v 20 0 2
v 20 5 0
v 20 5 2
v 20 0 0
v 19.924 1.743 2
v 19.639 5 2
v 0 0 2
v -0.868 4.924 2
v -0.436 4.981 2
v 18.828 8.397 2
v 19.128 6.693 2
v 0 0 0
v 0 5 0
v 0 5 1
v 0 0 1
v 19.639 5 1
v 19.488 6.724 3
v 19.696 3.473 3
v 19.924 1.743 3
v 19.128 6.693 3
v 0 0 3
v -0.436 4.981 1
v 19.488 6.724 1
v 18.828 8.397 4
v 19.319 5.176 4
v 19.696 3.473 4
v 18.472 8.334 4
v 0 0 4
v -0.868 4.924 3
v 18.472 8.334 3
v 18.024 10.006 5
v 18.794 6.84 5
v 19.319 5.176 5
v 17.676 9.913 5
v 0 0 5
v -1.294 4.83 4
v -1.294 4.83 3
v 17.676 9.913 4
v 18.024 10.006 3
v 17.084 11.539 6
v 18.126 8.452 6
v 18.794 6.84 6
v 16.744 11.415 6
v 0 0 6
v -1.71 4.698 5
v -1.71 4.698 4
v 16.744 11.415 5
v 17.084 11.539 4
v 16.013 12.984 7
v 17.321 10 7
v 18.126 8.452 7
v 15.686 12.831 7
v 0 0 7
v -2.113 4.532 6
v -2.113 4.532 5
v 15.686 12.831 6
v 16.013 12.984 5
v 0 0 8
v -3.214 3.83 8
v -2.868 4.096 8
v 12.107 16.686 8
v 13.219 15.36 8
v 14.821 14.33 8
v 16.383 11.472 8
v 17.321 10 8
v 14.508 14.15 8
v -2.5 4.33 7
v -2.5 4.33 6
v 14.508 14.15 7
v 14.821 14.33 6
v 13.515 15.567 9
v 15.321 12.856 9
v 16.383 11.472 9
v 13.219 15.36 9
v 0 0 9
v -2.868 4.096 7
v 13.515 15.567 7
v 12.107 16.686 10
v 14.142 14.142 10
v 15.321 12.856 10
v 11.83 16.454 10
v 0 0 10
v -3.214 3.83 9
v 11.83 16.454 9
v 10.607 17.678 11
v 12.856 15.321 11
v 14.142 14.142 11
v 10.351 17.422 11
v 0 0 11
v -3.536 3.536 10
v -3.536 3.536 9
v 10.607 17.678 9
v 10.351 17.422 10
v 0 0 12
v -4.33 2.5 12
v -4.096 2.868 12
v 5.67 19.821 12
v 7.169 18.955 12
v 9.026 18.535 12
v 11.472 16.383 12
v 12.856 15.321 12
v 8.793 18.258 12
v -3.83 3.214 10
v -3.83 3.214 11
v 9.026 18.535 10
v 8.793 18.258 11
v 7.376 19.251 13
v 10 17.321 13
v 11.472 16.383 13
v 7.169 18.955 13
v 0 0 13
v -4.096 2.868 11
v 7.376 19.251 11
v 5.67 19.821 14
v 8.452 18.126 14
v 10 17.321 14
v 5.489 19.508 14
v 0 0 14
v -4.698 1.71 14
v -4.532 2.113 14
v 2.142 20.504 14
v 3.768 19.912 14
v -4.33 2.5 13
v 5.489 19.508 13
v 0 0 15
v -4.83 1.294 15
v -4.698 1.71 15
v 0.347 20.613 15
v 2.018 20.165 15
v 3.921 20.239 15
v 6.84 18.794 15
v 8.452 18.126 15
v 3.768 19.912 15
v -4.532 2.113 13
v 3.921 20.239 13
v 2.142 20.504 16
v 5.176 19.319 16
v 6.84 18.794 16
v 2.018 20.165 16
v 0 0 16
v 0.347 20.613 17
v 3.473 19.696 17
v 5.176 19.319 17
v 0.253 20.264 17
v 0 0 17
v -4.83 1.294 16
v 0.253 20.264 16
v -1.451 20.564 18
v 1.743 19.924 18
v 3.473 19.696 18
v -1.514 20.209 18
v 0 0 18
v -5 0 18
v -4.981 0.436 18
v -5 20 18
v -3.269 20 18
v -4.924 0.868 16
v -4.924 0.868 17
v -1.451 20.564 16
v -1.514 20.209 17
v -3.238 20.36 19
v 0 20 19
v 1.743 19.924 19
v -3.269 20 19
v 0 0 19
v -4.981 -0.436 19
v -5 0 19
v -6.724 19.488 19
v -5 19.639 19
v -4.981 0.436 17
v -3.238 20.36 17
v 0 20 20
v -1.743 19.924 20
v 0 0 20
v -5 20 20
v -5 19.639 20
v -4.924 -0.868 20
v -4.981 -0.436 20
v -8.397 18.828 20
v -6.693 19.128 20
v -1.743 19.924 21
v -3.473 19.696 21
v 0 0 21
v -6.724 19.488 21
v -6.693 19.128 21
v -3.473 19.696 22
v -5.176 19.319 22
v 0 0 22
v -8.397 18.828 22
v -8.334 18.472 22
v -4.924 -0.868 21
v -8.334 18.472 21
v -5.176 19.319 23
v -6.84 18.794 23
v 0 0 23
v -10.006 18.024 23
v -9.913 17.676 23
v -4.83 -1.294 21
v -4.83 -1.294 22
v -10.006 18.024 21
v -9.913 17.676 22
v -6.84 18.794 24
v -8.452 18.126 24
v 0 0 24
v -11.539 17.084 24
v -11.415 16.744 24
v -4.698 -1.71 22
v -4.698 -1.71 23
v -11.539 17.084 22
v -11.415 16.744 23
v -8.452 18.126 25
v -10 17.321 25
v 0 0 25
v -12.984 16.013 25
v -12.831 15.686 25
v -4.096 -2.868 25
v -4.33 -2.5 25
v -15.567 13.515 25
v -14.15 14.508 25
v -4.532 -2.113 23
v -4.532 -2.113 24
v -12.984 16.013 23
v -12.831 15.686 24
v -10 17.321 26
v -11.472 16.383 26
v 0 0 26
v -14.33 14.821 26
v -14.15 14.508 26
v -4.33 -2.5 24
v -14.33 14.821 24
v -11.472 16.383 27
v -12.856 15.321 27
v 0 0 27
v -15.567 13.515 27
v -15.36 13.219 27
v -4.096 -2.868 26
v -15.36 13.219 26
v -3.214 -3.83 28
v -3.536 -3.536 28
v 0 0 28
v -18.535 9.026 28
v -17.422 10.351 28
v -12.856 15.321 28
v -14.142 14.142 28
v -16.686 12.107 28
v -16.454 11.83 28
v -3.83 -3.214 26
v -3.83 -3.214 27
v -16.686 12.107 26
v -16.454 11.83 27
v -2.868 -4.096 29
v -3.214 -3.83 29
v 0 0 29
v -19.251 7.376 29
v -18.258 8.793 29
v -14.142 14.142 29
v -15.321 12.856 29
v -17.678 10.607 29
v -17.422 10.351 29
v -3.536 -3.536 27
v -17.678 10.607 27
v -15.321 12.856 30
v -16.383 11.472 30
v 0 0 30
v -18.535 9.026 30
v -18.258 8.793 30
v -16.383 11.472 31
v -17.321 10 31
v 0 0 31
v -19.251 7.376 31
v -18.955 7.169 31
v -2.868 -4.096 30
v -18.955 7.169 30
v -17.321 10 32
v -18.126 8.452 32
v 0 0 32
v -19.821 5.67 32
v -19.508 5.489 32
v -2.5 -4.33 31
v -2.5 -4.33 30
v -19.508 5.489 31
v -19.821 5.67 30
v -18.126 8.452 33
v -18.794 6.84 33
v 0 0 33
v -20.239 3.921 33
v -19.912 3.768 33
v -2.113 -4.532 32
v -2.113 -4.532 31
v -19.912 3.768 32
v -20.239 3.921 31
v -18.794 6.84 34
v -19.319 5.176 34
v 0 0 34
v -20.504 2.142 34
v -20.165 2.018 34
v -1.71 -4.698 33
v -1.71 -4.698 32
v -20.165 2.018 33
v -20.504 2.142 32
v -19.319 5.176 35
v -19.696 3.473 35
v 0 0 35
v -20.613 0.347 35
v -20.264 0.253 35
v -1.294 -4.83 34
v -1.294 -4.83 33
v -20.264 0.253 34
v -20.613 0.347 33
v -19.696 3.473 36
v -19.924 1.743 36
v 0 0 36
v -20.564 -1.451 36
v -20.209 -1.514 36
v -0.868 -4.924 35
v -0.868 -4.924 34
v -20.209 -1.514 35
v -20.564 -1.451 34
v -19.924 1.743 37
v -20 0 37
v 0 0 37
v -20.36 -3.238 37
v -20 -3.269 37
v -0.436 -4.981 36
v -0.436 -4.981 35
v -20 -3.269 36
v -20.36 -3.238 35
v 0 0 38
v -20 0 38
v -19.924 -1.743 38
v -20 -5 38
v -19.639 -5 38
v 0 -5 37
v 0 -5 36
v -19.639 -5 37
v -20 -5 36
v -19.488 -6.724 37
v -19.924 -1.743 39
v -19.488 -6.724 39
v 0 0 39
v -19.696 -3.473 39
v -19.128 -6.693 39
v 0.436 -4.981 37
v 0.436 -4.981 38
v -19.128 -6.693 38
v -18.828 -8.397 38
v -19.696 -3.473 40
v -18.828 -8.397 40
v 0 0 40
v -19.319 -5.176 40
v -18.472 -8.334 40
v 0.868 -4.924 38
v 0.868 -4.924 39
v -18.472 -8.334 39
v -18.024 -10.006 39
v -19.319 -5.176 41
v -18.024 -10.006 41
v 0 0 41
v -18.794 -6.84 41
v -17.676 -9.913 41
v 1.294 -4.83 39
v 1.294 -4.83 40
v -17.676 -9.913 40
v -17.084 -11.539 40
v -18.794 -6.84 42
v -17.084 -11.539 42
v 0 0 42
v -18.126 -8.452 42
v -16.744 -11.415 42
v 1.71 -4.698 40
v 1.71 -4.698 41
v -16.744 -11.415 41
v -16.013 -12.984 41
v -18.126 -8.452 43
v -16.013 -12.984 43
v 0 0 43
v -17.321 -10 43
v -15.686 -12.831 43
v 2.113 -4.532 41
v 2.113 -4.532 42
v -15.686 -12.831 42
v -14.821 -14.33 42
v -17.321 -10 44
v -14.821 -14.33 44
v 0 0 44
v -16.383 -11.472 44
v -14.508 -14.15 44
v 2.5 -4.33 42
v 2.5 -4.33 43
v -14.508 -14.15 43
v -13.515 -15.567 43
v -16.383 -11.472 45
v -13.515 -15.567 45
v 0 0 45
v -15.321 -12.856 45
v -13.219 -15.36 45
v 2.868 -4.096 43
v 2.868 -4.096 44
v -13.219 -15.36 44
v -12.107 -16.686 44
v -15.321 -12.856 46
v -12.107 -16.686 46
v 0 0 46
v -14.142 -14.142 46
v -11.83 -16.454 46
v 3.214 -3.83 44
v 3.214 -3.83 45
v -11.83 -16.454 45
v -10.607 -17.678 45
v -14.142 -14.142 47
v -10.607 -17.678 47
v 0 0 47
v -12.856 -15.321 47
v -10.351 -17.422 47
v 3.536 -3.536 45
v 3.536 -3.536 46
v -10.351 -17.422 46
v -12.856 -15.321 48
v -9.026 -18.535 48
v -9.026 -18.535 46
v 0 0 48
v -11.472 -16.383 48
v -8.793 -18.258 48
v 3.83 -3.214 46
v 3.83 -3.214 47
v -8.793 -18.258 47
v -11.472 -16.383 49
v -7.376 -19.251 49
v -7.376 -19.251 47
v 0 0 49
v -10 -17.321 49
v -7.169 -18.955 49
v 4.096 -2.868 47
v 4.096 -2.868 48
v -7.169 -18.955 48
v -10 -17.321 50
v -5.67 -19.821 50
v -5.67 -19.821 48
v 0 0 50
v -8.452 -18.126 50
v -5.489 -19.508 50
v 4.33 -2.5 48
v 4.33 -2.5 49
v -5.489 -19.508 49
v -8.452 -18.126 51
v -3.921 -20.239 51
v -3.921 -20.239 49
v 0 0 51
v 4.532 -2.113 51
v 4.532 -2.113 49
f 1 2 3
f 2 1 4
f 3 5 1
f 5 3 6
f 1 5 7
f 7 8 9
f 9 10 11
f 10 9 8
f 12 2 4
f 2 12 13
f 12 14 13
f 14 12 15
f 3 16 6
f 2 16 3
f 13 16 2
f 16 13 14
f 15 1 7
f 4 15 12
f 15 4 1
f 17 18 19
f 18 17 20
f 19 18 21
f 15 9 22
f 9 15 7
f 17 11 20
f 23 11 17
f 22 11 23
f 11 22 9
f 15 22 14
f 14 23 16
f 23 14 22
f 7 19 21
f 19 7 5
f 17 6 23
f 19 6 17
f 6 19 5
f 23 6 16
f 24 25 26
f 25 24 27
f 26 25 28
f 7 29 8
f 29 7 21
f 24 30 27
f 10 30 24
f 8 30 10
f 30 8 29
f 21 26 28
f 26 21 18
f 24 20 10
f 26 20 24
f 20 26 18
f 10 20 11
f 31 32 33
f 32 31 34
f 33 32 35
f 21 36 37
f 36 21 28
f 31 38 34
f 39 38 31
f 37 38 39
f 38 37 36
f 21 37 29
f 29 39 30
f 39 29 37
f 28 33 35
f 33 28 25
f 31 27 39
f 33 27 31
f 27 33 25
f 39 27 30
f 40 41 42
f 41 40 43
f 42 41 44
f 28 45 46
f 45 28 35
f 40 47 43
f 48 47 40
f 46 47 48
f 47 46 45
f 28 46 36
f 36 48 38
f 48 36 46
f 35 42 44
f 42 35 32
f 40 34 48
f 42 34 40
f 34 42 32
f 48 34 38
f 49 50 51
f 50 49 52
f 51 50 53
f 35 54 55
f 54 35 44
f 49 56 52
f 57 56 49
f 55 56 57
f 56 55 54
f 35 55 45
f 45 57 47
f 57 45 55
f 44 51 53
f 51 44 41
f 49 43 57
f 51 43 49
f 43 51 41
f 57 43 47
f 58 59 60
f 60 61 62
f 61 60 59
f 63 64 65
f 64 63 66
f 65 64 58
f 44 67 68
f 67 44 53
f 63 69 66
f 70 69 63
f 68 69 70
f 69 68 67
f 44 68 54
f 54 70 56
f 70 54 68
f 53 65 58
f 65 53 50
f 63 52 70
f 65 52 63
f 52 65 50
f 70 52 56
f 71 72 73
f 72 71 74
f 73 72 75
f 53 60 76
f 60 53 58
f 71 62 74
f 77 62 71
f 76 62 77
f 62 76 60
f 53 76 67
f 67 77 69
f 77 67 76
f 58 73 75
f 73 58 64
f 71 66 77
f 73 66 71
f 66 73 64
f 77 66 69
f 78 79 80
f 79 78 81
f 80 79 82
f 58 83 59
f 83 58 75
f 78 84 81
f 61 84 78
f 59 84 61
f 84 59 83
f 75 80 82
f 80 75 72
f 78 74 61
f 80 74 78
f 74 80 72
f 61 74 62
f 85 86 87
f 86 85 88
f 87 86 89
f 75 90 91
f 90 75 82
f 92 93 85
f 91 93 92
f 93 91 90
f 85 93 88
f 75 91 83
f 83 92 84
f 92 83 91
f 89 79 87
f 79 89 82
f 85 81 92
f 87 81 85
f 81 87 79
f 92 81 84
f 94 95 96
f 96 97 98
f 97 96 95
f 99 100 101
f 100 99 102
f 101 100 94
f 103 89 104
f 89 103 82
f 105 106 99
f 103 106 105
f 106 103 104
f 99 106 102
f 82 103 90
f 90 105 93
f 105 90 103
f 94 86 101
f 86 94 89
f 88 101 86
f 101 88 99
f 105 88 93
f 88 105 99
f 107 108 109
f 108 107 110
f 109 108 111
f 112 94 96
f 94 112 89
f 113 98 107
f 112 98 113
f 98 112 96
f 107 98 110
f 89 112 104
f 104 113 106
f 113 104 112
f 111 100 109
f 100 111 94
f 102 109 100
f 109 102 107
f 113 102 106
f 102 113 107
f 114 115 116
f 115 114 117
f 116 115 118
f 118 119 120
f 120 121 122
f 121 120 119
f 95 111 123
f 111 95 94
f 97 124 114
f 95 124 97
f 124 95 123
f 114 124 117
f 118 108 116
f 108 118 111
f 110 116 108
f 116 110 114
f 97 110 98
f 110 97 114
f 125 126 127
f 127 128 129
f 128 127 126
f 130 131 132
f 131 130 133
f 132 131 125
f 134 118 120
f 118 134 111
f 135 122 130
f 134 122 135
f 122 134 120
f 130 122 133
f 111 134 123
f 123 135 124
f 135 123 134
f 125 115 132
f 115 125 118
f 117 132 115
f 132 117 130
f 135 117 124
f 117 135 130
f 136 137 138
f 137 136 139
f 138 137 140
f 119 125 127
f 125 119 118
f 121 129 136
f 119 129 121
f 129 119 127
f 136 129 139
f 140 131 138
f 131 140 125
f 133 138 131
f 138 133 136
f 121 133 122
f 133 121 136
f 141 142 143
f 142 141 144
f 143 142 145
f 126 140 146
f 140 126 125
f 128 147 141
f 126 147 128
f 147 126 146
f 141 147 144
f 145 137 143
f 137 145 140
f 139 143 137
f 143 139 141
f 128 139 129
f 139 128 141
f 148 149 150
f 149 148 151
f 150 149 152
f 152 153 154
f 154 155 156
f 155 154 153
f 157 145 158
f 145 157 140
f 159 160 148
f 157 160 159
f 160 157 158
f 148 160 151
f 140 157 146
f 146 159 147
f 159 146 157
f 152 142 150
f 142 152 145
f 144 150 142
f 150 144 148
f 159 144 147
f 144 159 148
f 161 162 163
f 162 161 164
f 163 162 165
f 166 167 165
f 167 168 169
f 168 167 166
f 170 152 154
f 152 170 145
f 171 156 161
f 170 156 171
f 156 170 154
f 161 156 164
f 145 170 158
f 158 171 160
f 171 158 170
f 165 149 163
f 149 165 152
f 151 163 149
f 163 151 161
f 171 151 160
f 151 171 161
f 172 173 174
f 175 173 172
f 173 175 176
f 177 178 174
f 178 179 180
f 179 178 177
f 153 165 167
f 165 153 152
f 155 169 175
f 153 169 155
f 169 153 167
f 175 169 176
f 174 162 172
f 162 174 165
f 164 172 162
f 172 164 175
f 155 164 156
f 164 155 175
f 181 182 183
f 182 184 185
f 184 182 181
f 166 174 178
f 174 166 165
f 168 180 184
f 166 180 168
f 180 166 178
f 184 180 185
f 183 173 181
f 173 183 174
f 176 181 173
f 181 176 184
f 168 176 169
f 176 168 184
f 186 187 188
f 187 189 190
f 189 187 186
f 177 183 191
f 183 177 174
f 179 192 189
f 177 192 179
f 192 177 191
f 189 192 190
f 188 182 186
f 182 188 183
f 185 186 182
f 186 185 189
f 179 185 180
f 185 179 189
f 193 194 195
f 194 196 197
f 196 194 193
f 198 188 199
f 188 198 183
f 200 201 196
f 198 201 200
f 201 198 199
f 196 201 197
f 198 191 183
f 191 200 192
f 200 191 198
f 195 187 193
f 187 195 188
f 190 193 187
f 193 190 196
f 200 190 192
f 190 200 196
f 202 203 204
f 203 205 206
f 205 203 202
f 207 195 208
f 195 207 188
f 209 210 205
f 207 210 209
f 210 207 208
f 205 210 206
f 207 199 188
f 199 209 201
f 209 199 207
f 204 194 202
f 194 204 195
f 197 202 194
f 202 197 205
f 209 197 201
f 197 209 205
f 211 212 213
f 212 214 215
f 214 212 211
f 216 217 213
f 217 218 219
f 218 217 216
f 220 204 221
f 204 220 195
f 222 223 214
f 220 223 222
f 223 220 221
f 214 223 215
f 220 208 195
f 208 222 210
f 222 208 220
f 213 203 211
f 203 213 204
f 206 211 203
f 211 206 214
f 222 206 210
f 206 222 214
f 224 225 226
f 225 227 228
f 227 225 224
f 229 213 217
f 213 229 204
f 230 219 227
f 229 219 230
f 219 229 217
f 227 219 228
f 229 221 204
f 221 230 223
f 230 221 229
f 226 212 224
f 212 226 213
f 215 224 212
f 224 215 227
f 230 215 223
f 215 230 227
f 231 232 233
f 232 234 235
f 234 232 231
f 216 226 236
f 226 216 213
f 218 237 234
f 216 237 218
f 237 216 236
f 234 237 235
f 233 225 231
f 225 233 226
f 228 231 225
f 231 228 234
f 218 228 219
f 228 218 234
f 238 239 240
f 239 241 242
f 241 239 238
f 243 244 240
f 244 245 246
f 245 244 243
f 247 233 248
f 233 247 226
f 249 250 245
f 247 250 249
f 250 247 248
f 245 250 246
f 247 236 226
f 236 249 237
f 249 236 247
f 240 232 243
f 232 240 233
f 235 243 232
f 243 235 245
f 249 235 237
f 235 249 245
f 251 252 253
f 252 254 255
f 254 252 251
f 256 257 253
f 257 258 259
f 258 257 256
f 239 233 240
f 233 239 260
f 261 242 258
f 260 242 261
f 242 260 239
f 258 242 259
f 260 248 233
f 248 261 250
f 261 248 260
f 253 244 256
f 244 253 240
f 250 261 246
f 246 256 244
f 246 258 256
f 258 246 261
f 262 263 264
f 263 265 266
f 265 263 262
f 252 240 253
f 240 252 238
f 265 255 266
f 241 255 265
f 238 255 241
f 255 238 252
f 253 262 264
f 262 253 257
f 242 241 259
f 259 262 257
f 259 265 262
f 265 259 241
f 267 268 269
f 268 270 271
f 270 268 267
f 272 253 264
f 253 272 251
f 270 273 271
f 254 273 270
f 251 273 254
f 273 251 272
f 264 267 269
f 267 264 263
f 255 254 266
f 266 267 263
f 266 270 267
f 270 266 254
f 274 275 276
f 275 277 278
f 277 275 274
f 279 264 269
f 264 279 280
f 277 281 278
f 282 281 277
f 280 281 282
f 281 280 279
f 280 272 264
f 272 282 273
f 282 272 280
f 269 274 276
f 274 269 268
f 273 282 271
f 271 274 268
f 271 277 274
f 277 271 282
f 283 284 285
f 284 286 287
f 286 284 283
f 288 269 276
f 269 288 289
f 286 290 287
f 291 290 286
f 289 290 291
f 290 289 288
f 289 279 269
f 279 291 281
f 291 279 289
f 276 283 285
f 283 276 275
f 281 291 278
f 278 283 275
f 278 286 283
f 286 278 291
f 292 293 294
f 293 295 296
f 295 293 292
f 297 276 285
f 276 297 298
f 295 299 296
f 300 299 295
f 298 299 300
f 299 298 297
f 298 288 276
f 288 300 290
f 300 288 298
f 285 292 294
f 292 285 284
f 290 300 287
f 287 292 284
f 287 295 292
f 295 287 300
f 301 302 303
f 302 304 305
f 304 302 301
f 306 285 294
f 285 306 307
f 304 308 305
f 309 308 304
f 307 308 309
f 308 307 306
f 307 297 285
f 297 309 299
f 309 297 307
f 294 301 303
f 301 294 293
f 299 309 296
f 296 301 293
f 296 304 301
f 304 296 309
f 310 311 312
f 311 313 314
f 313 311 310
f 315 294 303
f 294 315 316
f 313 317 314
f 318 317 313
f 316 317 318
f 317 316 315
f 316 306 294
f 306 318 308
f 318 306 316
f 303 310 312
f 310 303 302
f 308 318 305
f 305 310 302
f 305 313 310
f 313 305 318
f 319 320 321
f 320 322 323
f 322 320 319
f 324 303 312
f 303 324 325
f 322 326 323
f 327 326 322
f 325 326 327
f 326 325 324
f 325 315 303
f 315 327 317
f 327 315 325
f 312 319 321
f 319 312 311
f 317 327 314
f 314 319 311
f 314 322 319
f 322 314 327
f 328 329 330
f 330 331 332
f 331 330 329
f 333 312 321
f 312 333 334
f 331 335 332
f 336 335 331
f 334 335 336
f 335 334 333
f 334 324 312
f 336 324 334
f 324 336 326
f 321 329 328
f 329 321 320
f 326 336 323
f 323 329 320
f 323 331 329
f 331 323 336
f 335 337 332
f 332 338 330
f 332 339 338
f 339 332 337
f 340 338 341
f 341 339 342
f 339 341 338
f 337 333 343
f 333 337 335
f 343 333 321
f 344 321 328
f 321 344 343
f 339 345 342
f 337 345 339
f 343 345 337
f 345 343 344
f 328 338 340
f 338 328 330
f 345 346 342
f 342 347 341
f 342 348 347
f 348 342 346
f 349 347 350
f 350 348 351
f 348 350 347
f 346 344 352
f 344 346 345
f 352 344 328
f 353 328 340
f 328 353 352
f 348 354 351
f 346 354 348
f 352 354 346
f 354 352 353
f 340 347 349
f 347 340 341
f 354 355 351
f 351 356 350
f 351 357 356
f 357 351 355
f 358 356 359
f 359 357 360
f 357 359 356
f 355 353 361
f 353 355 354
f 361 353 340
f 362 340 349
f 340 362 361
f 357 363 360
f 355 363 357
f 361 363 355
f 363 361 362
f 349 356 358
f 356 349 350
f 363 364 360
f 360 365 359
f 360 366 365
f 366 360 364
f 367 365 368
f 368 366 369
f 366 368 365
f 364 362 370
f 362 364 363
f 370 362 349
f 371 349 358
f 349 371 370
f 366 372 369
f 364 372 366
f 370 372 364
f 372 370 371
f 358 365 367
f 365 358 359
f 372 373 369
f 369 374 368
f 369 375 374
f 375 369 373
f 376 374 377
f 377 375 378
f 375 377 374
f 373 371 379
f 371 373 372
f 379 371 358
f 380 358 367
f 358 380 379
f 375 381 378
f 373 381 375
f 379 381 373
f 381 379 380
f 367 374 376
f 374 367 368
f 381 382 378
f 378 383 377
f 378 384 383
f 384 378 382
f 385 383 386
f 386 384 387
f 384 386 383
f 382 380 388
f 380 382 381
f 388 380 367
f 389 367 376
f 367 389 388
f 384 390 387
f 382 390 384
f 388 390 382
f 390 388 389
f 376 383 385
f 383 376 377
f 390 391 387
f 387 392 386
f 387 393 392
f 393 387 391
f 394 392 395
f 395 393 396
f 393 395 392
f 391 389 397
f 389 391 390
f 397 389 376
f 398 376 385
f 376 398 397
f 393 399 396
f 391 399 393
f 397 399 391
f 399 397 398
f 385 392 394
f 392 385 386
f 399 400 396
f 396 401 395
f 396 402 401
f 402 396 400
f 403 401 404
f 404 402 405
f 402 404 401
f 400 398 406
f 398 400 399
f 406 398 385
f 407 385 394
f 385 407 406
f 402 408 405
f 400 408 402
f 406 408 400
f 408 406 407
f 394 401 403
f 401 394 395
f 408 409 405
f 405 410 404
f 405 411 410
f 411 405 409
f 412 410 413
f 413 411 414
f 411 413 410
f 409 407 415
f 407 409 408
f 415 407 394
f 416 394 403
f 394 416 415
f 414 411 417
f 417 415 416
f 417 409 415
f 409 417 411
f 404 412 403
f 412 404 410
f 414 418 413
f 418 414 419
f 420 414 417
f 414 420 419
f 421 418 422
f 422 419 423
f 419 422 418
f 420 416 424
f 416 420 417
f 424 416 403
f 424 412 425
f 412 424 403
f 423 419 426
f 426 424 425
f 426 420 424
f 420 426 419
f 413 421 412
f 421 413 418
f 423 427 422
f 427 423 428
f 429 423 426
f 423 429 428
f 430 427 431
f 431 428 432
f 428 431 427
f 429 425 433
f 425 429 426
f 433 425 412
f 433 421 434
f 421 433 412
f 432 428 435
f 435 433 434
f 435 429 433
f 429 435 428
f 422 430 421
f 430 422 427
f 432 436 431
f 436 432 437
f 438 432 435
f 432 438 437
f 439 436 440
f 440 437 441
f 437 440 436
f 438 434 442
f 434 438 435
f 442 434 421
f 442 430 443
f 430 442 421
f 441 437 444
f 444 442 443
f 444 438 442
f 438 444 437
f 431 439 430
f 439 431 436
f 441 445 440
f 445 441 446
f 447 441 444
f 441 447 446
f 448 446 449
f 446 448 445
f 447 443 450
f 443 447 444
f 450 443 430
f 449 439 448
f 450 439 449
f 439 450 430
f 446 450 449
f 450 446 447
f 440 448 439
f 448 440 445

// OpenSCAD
union() {
	translate(v = [0, 0, 0]) {
		rotate(a = 0, v = [0, 0, 1]) {
			cube(size = [20, 5, 2]);
		}
	}
	translate(v = [0, 0, 1]) {
		rotate(a = 5, v = [0, 0, 1]) {
			cube(size = [20, 5, 2]);
		}
	}
	translate(v = [0, 0, 2]) {
		rotate(a = 10, v = [0, 0, 1]) {
			cube(size = [20, 5, 2]);
		}
	}
	translate(v = [0, 0, 3]) {
		rotate(a = 15, v = [0, 0, 1]) {
			cube(size = [20, 5, 2]);
		}
	}
	translate(v = [0, 0, 4]) {
		rotate(a = 20, v = [0, 0, 1]) {
			cube(size = [20, 5, 2]);
		}
	}
	translate(v = [0, 0, 5]) {
		rotate(a = 25, v = [0, 0, 1]) {
			cube(size = [20, 5, 2]);
		}
	}
	translate(v = [0, 0, 6]) {
		rotate(a = 30, v = [0, 0, 1]) {
			cube(size = [20, 5, 2]);
		}
	}
	translate(v = [0, 0, 7]) {
		rotate(a = 35, v = [0, 0, 1]) {
			cube(size = [20, 5, 2]);
		}
	}
	translate(v = [0, 0, 8]) {
		rotate(a = 40, v = [0, 0, 1]) {
			cube(size = [20, 5, 2]);
		}
	}
	translate(v = [0, 0, 9]) {
		rotate(a = 45, v = [0, 0, 1]) {
			cube(size = [20, 5, 2]);
		}
	}
	translate(v = [0, 0, 10]) {
		rotate(a = 50, v = [0, 0, 1]) {
			cube(size = [20, 5, 2]);
		}
	}
	translate(v = [0, 0, 11]) {
		rotate(a = 55, v = [0, 0, 1]) {
			cube(size = [20, 5, 2]);
		}
	}
	translate(v = [0, 0, 12]) {
		rotate(a = 60, v = [0, 0, 1]) {
			cube(size = [20, 5, 2]);
		}
	}
	translate(v = [0, 0, 13]) {
		rotate(a = 65, v = [0, 0, 1]) {
			cube(size = [20, 5, 2]);
		}
	}
	translate(v = [0, 0, 14]) {
		rotate(a = 70, v = [0, 0, 1]) {
			cube(size = [20, 5, 2]);
		}
	}
	translate(v = [0, 0, 15]) {
		rotate(a = 75, v = [0, 0, 1]) {
			cube(size = [20, 5, 2]);
		}
	}
	translate(v = [0, 0, 16]) {
		rotate(a = 80, v = [0, 0, 1]) {
			cube(size = [20, 5, 2]);
		}
	}
	translate(v = [0, 0, 17]) {
		rotate(a = 85, v = [0, 0, 1]) {
			cube(size = [20, 5, 2]);
		}
	}
	translate(v = [0, 0, 18]) {
		rotate(a = 90, v = [0, 0, 1]) {
			cube(size = [20, 5, 2]);
		}
	}
	translate(v = [0, 0, 19]) {
		rotate(a = 95, v = [0, 0, 1]) {
			cube(size = [20, 5, 2]);
		}
	}
	translate(v = [0, 0, 20]) {
		rotate(a = 100, v = [0, 0, 1]) {
			cube(size = [20, 5, 2]);
		}
	}
	translate(v = [0, 0, 21]) {
		rotate(a = 105, v = [0, 0, 1]) {
			cube(size = [20, 5, 2]);
		}
	}
	translate(v = [0, 0, 22]) {
		rotate(a = 110, v = [0, 0, 1]) {
			cube(size = [20, 5, 2]);
		}
	}
	translate(v = [0, 0, 23]) {
		rotate(a = 115, v = [0, 0, 1]) {
			cube(size = [20, 5, 2]);
		}
	}
	translate(v = [0, 0, 24]) {
		rotate(a = 120, v = [0, 0, 1]) {
			cube(size = [20, 5, 2]);
		}
	}
	translate(v = [0, 0, 25]) {
		rotate(a = 125, v = [0, 0, 1]) {
			cube(size = [20, 5, 2]);
		}
	}
	translate(v = [0, 0, 26]) {
		rotate(a = 130, v = [0, 0, 1]) {
			cube(size = [20, 5, 2]);
		}
	}
	translate(v = [0, 0, 27]) {
		rotate(a = 135, v = [0, 0, 1]) {
			cube(size = [20, 5, 2]);
		}
	}
	translate(v = [0, 0, 28]) {
		rotate(a = 140, v = [0, 0, 1]) {
			cube(size = [20, 5, 2]);
		}
	}
	translate(v = [0, 0, 29]) {
		rotate(a = 145, v = [0, 0, 1]) {
			cube(size = [20, 5, 2]);
		}
	}
	translate(v = [0, 0, 30]) {
		rotate(a = 150, v = [0, 0, 1]) {
			cube(size = [20, 5, 2]);
		}
	}
	translate(v = [0, 0, 31]) {
		rotate(a = 155, v = [0, 0, 1]) {
			cube(size = [20, 5, 2]);
		}
	}
	translate(v = [0, 0, 32]) {
		rotate(a = 160, v = [0, 0, 1]) {
			cube(size = [20, 5, 2]);
		}
	}
	translate(v = [0, 0, 33]) {
		rotate(a = 165, v = [0, 0, 1]) {
			cube(size = [20, 5, 2]);
		}
	}
	translate(v = [0, 0, 34]) {
		rotate(a = 170, v = [0, 0, 1]) {
			cube(size = [20, 5, 2]);
		}
	}
	translate(v = [0, 0, 35]) {
		rotate(a = 175, v = [0, 0, 1]) {
			cube(size = [20, 5, 2]);
		}
	}
	translate(v = [0, 0, 36]) {
		rotate(a = 180, v = [0, 0, 1]) {
			cube(size = [20, 5, 2]);
		}
	}
	translate(v = [0, 0, 37]) {
		rotate(a = 185, v = [0, 0, 1]) {
			cube(size = [20, 5, 2]);
		}
	}
	translate(v = [0, 0, 38]) {
		rotate(a = 190, v = [0, 0, 1]) {
			cube(size = [20, 5, 2]);
		}
	}
	translate(v = [0, 0, 39]) {
		rotate(a = 195, v = [0, 0, 1]) {
			cube(size = [20, 5, 2]);
		}
	}
	translate(v = [0, 0, 40]) {
		rotate(a = 200, v = [0, 0, 1]) {
			cube(size = [20, 5, 2]);
		}
	}
	translate(v = [0, 0, 41]) {
		rotate(a = 205, v = [0, 0, 1]) {
			cube(size = [20, 5, 2]);
		}
	}
	translate(v = [0, 0, 42]) {
		rotate(a = 210, v = [0, 0, 1]) {
			cube(size = [20, 5, 2]);
		}
	}
	translate(v = [0, 0, 43]) {
		rotate(a = 215, v = [0, 0, 1]) {
			cube(size = [20, 5, 2]);
		}
	}
	translate(v = [0, 0, 44]) {
		rotate(a = 220, v = [0, 0, 1]) {
			cube(size = [20, 5, 2]);
		}
	}
	translate(v = [0, 0, 45]) {
		rotate(a = 225, v = [0, 0, 1]) {
			cube(size = [20, 5, 2]);
		}
	}
	translate(v = [0, 0, 46]) {
		rotate(a = 230, v = [0, 0, 1]) {
			cube(size = [20, 5, 2]);
		}
	}
	translate(v = [0, 0, 47]) {
		rotate(a = 235, v = [0, 0, 1]) {
			cube(size = [20, 5, 2]);
		}
	}
	translate(v = [0, 0, 48]) {
		rotate(a = 240, v = [0, 0, 1]) {
			cube(size = [20, 5, 2]);
		}
	}
	translate(v = [0, 0, 49]) {
		rotate(a = 245, v = [0, 0, 1]) {
			cube(size = [20, 5, 2]);
		}
	}
}
